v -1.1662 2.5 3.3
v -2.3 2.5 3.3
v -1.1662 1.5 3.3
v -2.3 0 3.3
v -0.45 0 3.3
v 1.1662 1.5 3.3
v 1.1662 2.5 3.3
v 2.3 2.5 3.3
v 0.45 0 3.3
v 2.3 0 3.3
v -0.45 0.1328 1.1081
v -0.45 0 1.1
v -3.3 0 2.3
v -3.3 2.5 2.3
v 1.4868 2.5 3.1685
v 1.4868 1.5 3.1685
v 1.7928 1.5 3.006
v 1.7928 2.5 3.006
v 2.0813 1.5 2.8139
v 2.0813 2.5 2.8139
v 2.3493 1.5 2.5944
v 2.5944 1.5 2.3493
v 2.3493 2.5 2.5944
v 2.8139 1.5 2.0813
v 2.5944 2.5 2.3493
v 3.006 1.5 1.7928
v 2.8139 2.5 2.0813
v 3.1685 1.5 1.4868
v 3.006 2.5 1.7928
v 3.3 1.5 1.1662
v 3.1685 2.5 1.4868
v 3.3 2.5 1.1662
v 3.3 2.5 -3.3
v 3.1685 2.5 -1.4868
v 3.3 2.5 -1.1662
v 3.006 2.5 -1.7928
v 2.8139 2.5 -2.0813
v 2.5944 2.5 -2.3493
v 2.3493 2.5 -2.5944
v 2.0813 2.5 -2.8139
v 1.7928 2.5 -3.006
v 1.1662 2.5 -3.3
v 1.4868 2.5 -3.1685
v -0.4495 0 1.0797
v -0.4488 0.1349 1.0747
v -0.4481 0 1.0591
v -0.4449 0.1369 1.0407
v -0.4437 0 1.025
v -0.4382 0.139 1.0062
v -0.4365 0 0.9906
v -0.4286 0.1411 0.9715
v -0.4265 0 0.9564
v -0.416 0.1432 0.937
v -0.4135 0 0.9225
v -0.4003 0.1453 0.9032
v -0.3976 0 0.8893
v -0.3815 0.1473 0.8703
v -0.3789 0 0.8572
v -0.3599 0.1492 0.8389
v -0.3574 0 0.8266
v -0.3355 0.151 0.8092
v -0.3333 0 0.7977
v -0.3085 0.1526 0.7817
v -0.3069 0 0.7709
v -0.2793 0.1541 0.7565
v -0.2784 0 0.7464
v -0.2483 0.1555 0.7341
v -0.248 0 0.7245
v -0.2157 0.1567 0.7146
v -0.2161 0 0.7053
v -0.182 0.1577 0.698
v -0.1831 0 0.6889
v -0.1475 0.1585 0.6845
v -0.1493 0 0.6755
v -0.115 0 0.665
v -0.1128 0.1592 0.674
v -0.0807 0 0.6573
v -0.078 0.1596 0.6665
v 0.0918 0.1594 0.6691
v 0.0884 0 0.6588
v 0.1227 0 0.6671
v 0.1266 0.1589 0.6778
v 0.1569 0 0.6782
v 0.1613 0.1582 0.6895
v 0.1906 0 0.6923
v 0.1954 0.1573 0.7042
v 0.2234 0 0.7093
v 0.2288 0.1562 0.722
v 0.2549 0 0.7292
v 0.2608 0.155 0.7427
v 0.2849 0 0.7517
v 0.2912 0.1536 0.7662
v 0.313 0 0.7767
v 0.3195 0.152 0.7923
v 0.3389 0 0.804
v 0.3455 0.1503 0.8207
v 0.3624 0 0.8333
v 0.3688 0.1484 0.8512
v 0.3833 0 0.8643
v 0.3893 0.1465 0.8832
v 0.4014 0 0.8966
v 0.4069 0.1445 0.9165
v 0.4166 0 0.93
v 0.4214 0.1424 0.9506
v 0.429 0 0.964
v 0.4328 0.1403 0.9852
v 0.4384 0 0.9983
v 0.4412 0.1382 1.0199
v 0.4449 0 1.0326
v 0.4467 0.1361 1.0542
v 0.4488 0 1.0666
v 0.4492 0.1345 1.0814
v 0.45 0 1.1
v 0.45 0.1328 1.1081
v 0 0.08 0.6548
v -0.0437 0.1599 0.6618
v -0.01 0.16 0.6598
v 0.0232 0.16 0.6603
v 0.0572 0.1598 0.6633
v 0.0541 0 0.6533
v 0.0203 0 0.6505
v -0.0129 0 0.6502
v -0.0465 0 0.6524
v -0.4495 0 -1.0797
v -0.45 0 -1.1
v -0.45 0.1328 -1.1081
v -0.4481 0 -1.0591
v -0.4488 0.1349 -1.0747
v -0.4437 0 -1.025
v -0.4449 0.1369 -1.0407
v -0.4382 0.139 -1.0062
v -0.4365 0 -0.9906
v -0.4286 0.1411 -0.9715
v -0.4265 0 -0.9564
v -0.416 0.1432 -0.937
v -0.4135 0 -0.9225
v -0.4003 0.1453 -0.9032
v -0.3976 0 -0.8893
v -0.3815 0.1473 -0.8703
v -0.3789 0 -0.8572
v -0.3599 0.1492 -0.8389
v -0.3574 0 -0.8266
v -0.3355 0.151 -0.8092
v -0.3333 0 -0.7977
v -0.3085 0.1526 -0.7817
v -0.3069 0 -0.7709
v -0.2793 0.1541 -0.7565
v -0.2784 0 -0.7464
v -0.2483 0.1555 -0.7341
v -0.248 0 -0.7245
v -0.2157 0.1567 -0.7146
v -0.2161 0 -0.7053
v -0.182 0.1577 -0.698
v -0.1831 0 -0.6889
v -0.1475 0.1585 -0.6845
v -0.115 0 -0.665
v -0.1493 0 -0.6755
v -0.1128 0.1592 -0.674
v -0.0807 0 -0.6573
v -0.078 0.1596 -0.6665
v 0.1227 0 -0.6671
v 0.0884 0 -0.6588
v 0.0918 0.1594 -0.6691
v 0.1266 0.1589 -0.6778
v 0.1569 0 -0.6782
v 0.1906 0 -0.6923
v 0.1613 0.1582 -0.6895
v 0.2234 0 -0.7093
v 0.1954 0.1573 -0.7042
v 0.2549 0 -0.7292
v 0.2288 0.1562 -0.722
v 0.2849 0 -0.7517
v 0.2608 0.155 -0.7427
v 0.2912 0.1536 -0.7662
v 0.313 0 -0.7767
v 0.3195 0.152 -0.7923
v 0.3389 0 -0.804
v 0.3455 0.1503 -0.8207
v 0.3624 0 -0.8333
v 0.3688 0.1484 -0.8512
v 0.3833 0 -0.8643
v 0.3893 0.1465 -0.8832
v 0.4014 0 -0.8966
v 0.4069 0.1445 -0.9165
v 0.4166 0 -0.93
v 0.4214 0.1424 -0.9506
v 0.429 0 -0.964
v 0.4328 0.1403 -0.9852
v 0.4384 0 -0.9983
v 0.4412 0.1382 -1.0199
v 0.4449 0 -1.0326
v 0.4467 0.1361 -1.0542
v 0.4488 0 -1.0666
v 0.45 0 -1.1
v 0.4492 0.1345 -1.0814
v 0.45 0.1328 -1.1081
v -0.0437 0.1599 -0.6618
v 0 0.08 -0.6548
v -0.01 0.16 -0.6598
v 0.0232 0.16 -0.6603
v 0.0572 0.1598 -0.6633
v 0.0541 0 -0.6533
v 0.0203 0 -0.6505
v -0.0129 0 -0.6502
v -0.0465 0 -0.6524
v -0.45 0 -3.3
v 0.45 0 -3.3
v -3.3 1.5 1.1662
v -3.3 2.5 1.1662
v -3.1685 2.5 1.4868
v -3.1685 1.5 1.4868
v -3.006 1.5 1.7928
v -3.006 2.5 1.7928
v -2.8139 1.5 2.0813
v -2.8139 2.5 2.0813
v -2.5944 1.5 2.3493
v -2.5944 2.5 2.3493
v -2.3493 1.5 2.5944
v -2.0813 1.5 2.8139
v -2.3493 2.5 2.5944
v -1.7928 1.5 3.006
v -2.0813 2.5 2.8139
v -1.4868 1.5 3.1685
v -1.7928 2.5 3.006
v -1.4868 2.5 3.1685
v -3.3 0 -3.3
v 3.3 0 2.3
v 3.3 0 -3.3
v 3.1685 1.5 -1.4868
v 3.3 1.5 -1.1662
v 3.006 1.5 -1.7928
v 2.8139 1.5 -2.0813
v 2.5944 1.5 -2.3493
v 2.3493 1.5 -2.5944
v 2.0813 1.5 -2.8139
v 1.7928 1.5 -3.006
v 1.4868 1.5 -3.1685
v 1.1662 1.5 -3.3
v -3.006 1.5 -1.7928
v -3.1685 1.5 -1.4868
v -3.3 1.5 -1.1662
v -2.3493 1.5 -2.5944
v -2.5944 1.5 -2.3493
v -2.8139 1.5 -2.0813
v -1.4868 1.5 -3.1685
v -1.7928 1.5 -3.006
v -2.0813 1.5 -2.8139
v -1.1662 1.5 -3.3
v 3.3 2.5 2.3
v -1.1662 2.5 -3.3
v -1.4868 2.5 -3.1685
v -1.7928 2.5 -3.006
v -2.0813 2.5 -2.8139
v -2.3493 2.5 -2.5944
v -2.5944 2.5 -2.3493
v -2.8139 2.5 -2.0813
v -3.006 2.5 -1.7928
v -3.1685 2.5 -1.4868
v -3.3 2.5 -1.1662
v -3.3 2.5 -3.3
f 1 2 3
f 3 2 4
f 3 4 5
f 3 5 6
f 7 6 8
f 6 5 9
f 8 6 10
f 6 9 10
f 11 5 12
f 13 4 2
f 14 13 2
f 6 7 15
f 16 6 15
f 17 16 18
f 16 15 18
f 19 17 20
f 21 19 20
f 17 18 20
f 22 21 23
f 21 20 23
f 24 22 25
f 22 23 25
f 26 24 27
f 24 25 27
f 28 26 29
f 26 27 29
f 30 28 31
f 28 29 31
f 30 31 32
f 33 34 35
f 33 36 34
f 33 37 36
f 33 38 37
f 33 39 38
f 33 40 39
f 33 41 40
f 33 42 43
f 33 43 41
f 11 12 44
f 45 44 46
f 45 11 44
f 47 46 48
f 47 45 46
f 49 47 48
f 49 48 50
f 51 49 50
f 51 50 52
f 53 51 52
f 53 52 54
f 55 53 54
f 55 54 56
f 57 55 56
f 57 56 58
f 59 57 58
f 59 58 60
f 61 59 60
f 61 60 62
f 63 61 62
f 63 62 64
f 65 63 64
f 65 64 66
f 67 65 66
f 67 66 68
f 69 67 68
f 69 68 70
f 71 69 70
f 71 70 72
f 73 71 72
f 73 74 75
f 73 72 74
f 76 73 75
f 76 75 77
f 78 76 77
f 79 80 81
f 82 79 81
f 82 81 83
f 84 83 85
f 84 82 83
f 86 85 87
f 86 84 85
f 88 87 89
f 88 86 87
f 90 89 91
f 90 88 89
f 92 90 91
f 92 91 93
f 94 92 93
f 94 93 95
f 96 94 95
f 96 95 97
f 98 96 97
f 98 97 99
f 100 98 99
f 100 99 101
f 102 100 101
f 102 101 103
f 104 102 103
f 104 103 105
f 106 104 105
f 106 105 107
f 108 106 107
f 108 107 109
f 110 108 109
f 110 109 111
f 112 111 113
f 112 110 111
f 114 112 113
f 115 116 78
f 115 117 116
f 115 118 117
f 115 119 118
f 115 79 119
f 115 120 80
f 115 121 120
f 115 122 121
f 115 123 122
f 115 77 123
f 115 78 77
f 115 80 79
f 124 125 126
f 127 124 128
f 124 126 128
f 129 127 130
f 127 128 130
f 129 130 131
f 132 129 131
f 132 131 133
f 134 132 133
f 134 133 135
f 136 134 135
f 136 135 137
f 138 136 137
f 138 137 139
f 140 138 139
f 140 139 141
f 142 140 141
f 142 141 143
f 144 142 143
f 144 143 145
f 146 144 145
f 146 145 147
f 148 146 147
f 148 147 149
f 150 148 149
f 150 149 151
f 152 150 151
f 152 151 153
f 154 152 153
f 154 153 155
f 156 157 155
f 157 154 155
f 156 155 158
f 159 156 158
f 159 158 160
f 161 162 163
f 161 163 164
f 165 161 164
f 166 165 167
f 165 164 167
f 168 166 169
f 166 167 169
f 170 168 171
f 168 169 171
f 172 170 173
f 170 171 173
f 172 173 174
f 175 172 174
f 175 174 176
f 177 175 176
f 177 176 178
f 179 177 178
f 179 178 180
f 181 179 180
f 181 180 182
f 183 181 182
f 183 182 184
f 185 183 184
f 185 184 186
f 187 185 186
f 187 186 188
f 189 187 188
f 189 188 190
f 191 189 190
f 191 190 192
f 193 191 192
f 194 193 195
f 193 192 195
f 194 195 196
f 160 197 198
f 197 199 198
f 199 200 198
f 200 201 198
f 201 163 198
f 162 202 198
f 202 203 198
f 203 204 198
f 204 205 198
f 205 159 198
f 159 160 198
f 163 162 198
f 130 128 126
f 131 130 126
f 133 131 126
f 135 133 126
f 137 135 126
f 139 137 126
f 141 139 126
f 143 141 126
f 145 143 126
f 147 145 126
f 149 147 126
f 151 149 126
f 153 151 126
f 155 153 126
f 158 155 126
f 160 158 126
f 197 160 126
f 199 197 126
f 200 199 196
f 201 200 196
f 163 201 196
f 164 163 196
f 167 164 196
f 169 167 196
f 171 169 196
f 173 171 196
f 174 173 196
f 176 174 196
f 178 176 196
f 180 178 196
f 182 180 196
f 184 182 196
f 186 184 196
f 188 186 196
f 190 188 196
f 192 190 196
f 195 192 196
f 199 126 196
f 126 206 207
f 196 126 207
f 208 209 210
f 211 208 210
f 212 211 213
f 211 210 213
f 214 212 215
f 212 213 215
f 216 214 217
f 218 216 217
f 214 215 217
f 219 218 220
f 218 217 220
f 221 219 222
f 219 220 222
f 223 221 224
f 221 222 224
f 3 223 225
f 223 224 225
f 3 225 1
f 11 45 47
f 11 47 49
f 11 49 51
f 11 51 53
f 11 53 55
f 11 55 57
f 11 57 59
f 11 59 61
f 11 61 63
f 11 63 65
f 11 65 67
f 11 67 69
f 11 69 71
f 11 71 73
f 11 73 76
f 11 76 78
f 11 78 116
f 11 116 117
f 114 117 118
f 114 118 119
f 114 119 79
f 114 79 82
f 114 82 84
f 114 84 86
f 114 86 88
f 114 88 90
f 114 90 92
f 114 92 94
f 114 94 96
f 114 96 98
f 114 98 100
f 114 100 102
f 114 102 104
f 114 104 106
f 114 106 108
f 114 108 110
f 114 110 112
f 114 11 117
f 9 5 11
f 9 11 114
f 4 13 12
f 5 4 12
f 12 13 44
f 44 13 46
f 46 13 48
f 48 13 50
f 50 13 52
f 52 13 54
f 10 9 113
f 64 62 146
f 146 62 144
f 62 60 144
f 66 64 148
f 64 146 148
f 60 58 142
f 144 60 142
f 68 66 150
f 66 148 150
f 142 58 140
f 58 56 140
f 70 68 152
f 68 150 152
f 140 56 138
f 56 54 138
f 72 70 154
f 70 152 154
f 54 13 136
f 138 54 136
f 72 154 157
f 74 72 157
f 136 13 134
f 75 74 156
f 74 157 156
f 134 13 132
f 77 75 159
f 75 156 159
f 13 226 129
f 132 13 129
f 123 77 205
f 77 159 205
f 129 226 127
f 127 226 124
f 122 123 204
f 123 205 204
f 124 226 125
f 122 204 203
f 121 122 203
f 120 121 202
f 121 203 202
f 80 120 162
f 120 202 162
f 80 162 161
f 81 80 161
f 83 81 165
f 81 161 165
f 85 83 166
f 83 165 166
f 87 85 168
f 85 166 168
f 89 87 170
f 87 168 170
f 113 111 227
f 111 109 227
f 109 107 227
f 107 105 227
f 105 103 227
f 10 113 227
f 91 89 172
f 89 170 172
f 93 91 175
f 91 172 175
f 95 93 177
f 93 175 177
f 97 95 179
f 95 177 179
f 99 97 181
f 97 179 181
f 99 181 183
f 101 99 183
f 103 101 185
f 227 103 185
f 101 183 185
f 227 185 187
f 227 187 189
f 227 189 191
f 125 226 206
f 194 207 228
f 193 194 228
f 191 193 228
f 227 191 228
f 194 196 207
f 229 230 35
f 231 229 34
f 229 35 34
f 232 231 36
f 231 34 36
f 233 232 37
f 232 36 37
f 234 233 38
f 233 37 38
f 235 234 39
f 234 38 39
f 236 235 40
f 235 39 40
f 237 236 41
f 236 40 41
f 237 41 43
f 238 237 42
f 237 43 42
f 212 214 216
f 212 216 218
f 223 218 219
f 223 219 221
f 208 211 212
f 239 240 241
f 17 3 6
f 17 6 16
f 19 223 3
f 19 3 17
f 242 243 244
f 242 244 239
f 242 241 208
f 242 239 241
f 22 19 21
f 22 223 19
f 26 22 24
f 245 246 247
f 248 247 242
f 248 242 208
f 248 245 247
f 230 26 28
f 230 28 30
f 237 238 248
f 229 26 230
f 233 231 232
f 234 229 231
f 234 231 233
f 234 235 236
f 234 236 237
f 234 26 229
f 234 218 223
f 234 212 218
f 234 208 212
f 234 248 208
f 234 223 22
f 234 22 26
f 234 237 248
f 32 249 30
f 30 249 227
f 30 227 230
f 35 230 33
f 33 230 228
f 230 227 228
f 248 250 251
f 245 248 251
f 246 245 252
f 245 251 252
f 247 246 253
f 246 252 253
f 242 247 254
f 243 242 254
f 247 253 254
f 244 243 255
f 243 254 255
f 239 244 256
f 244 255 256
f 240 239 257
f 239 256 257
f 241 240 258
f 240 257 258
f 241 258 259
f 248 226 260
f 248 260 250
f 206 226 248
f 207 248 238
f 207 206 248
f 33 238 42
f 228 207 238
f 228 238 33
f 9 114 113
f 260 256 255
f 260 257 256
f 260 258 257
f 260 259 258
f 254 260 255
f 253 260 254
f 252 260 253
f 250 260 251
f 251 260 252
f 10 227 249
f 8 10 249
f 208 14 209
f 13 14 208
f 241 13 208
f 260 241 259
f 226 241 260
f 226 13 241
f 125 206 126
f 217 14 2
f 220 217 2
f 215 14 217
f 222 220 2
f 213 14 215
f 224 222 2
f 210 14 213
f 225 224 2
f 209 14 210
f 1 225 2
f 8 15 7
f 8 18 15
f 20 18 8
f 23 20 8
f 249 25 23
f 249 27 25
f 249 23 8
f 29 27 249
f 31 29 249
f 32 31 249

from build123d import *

# Parameters (mm, degrees)
SKETCH1_W           = 6.6
SKETCH1_H           = 6.6
BOSS_EXTRUDE1_DEPTH = 2.5
CHAMFER1_SIZE       = 1
SKETCH3_R           = 3.5
CUT_EXTRUDE1_DEPTH  = 1
CUT_EXTRUDE3_DEPTH  = 6.210875214


with BuildPart() as part:
    # Sketch1 → Boss-Extrude1 (new body)
    with BuildSketch(Plane(origin=(0, 0, 0), x_dir=(1, 0, 0), z_dir=(0, 1, 0))):
        Rectangle(SKETCH1_W, SKETCH1_H)
    extrude(amount=BOSS_EXTRUDE1_DEPTH)

    # Chamfer1
    chamfer1_edges = [part.edges().sort_by_distance(p)[0] for p in [
        (3.3, 1.25, 3.3),
        (-3.3, 1.25, 3.3),
    ]]
    chamfer(chamfer1_edges, length=CHAMFER1_SIZE)

    # Sketch3 → Cut-Extrude1 (cut)
    with BuildSketch(Plane(origin=(0, 2.5, 0), x_dir=(1, 0, 0), z_dir=(0, 1, 0))):
        Circle(SKETCH3_R)
    extrude(amount=-CUT_EXTRUDE1_DEPTH, mode=Mode.SUBTRACT)

    # Sketch6 → Cut-Extrude3 (cut, through all)
    with BuildSketch(Plane(origin=(0, 0.19926807, -0.012076853), x_dir=(1, 0, 0), z_dir=(0, 0.9981684966311909, -0.060495060401890365))):
        with BuildLine():
            Line((-0.45, 3.293956039), (-0.45, 1.097985346))
            add(Edge.make_bspline(
                [(-0.45, 1.097985346), (-0.45, 0.648809523), (0, 0.648809523), (0.45, 0.648809523), (0.45, 1.097985346)],
                knots=[3.141592654, 3.141592654, 3.141592654, 4.71238898, 4.71238898, 6.283185307, 6.283185307, 6.283185307], degree=2, weights=[1, 0.707106781, 1, 0.707106781, 1]))
            Line((0.45, 1.097985346), (0.45, 3.293956039))
            Line((0.45, 3.293956039), (-0.45, 3.293956039))
        make_face()
    cut_extrude3 = extrude(amount=-CUT_EXTRUDE3_DEPTH, mode=Mode.SUBTRACT)

    # Mirror1: Cut-Extrude3 across plane
    add(cut_extrude3.mirror(Plane.XY), mode=Mode.SUBTRACT)


solid = part.part
